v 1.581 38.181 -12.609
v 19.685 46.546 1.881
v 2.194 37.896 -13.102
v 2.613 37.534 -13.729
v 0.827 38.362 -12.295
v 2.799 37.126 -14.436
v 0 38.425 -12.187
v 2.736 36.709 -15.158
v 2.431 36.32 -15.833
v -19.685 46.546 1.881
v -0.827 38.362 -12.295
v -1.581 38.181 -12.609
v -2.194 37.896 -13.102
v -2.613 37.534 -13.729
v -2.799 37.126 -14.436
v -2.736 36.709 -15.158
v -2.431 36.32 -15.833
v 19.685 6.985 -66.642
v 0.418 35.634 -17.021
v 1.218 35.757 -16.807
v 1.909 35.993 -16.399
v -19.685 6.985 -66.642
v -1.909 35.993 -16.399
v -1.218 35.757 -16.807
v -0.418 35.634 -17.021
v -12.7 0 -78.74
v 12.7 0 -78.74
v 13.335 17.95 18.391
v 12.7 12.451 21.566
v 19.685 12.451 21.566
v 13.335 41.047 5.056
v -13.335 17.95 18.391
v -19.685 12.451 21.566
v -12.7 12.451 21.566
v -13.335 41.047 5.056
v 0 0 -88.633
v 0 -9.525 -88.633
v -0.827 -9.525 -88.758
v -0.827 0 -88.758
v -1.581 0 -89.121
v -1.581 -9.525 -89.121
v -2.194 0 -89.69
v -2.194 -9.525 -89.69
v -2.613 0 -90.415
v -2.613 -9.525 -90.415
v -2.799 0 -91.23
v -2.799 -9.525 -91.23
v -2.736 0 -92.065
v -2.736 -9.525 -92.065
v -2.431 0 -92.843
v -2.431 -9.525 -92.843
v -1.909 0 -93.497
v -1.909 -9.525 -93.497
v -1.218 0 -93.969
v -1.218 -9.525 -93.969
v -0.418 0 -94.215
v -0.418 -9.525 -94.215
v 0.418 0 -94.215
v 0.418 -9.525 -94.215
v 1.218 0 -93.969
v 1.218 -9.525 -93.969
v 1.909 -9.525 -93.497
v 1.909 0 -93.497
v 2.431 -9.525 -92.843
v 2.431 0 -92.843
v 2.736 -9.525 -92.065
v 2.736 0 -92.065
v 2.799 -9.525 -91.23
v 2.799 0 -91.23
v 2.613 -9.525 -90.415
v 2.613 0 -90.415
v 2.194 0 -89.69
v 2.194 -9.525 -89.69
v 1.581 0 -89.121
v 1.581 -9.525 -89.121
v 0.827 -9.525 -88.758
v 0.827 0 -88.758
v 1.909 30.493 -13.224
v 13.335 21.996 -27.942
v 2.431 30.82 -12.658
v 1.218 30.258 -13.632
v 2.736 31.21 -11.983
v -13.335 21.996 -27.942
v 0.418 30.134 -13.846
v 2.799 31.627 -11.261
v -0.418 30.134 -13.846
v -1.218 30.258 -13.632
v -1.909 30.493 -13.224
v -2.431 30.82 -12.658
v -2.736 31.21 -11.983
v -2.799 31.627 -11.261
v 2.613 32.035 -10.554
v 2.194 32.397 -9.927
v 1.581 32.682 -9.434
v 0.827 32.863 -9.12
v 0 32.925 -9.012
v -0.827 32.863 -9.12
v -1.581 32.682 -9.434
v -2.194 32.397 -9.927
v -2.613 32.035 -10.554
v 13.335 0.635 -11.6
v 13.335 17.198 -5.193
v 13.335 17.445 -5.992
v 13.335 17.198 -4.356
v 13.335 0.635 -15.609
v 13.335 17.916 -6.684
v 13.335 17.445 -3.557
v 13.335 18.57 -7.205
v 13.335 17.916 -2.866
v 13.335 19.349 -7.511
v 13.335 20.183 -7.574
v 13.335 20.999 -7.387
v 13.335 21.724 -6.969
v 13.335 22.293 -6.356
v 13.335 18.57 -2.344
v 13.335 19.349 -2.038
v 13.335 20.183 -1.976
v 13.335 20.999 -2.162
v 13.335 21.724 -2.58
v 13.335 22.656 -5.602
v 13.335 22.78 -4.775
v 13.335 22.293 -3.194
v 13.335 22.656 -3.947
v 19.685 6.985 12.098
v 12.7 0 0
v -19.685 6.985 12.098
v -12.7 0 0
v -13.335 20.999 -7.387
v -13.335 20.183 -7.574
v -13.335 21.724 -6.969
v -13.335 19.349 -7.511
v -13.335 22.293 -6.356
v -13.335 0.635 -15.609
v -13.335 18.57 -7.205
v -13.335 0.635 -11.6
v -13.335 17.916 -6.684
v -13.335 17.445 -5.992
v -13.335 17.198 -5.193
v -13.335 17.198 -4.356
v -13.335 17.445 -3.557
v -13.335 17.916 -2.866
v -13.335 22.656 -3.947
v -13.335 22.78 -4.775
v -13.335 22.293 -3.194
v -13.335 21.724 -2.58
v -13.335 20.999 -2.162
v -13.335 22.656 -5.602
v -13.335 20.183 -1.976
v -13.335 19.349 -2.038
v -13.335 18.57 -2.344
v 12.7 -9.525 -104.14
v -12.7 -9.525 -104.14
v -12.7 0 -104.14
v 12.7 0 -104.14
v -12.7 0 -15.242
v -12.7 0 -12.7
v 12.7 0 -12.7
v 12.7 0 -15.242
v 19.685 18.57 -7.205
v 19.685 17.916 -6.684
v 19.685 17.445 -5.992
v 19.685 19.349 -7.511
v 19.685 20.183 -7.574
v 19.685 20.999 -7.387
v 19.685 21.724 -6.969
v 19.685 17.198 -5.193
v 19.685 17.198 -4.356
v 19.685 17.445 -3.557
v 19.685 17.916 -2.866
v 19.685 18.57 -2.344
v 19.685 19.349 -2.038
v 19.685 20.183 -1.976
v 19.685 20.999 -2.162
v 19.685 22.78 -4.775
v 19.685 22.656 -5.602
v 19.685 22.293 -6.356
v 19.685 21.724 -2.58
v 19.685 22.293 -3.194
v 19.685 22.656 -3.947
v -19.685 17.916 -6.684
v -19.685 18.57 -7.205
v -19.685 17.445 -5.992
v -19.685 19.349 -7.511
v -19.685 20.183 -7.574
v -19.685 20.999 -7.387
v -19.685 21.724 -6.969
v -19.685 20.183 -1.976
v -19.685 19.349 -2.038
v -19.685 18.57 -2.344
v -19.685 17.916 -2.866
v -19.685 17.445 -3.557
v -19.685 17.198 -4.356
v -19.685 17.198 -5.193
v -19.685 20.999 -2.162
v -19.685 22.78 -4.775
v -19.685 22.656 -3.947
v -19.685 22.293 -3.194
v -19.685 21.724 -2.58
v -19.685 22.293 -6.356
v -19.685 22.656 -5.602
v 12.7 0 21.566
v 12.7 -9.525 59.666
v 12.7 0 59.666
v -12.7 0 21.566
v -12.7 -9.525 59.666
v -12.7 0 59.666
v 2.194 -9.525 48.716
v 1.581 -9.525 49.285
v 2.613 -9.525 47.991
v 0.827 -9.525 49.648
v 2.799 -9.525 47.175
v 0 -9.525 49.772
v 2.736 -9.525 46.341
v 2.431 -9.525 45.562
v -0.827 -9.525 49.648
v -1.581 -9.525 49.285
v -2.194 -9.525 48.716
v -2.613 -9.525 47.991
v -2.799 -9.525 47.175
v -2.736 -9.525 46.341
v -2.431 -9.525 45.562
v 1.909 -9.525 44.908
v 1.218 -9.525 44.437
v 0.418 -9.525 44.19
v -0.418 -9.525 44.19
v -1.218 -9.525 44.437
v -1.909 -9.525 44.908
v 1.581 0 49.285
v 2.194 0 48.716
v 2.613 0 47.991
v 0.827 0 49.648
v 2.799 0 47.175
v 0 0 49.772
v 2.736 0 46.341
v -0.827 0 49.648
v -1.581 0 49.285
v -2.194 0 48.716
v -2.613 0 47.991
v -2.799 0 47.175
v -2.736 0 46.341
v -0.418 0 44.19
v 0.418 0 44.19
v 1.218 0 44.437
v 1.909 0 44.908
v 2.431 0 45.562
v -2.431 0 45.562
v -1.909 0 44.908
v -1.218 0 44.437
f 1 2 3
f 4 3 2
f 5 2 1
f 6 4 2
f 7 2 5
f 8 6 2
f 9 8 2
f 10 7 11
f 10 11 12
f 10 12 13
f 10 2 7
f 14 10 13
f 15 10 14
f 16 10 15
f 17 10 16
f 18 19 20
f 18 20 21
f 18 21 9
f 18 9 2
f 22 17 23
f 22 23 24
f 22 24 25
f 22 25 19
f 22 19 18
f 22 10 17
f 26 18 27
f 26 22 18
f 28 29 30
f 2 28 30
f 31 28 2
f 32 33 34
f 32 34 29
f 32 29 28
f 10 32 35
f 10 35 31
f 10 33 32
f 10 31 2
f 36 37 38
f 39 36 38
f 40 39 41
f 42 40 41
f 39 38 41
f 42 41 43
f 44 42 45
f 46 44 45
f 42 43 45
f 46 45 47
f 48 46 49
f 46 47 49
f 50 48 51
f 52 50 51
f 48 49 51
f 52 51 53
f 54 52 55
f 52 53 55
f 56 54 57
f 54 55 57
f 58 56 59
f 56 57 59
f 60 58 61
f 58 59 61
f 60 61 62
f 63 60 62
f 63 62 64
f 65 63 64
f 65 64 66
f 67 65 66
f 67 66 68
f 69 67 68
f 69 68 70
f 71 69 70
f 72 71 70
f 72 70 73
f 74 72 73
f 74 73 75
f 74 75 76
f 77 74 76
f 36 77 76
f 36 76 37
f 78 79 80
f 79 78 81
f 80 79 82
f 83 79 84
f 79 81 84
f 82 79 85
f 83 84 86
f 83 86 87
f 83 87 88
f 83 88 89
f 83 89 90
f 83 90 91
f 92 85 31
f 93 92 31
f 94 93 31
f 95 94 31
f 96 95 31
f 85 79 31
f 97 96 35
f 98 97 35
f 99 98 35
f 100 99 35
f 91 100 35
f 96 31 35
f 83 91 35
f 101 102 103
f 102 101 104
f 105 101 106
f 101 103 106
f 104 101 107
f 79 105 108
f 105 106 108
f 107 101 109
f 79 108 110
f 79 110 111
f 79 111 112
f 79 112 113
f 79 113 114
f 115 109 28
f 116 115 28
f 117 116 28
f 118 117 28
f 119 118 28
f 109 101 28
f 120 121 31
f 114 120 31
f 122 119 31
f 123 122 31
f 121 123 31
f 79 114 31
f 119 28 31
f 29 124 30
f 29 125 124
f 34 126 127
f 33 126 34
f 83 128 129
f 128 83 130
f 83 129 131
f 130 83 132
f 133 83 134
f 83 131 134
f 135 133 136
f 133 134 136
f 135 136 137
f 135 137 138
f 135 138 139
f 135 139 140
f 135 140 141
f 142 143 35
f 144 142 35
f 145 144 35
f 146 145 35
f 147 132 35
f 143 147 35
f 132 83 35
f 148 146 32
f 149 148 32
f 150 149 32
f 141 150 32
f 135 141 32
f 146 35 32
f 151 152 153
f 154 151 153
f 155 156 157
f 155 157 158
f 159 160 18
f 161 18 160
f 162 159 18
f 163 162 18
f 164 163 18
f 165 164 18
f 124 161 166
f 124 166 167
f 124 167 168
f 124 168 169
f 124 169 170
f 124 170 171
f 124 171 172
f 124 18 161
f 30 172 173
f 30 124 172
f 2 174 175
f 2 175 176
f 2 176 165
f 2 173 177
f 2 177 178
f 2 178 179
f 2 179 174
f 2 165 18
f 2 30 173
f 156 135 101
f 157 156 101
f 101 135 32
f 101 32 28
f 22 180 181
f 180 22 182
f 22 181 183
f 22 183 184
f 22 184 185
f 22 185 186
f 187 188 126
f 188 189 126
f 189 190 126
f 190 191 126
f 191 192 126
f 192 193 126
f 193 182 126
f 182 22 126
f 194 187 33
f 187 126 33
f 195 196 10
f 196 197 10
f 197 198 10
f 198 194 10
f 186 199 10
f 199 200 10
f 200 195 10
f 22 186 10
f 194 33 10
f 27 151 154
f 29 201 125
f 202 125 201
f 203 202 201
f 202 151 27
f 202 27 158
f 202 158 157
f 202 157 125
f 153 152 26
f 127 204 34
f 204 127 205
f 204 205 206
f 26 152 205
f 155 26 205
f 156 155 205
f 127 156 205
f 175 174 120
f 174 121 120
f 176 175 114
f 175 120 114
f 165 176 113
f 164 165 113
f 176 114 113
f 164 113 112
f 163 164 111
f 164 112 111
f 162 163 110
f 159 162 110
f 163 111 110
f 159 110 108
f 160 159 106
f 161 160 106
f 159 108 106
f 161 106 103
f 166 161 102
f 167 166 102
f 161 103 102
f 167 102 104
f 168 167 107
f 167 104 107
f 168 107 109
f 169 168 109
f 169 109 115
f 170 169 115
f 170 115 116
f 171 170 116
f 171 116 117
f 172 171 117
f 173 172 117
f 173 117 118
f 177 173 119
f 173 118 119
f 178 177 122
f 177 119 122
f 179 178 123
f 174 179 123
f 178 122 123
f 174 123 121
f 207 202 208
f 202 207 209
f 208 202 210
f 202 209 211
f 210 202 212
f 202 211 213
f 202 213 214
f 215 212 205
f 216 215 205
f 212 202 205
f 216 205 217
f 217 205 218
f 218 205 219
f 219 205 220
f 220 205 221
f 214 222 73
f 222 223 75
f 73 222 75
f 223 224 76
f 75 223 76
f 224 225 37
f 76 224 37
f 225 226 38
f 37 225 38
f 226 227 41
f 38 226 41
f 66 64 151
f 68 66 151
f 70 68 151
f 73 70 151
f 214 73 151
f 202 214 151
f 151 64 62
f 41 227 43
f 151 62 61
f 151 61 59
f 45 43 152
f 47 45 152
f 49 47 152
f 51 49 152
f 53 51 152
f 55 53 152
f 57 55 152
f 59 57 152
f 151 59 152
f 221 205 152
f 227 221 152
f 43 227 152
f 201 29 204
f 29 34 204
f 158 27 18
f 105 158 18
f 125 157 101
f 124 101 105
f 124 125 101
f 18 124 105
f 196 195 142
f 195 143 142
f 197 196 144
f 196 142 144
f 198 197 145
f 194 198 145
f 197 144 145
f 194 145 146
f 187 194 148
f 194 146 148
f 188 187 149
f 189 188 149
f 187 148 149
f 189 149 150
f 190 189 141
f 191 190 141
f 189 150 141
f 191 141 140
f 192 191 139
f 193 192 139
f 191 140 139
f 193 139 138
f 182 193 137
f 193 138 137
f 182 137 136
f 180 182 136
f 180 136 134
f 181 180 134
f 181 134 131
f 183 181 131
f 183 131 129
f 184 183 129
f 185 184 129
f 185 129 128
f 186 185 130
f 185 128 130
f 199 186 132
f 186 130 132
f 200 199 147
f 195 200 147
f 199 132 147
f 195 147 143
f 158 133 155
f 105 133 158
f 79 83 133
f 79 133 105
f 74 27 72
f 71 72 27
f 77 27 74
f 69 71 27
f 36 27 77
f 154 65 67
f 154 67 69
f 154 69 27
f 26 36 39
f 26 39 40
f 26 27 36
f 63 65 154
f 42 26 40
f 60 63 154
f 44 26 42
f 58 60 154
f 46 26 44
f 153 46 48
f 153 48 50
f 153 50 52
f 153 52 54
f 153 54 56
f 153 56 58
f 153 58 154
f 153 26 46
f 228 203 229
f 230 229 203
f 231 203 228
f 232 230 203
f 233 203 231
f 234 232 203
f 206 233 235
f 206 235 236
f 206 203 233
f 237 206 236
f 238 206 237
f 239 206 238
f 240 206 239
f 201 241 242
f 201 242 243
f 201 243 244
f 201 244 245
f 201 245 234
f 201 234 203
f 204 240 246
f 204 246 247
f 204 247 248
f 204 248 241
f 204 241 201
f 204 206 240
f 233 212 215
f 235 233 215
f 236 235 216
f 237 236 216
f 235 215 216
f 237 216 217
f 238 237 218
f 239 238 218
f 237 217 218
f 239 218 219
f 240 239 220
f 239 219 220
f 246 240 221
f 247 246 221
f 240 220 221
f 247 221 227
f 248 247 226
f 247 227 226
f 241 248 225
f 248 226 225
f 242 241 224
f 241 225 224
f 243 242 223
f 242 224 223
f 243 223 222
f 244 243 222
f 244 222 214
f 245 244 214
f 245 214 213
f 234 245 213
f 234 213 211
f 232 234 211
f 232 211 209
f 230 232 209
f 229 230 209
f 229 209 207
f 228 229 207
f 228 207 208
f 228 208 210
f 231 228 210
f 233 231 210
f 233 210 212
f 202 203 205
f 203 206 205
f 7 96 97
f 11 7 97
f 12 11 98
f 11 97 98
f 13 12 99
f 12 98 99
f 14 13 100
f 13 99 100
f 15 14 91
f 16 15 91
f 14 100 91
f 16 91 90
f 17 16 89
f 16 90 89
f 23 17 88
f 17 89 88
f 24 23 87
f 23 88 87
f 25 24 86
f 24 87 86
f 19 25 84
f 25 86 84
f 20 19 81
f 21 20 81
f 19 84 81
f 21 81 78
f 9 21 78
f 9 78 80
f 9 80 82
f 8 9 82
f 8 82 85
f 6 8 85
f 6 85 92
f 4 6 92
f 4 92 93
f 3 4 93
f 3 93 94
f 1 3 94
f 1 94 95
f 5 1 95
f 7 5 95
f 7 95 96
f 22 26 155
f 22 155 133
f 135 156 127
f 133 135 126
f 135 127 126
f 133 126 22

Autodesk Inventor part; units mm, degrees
ref_plane "YZ Plane" through (0, 0, 0) normal (1, 0, 0) x (0, 1, 0)
ref_plane "XZ Plane" through (0, 0, 0) normal (0, 1, 0) x (-1, 0, 0)
ref_plane "XY Plane" through (0, 0, 0) normal (0, 0, 1) x (1, 0, 0)
sketch "Sketch1" plane through (0, 0, 0) normal (1, 0, 0) x (0, 1, 0)
  line L0 (0, 0) -> (12.4509, 21.5656)
  line L1 (12.4509, 21.5656) -> (46.5463, 1.8806)
  line L2 (0, -101.8491) -> (0, 42.1347) projected
  line L3 (46.5463, 1.8806) -> (0, -78.74)
  line L4 (0, 0) -> (0, -78.74)
  line L5 (19.05, 17.7556) -> (0, -15.24) construction
  dimension "d0" = 39.37
  dimension "d1" = 30
  dimension "d5" = 7.62
  dimension "d6" = 38.1
extrude "Extrusion1" add sketch "Sketch1" along normal mid plane 39.37
sketch "Sketch2" plane through (-19.685, 12.4509, 21.5656) normal (0, 0.5, 0.866) x (1, 0, 0)
  line L0 (0, 0) -> (39.37, 0) construction
  line L1 (39.37, 0) -> (39.37, 39.37) construction
  line L2 (0, 0) -> (39.37, 39.37) construction
  line L3 (39.37, 39.37) -> (0, 39.37) construction
  line L4 (0, 39.37) -> (39.37, 0) construction
  line L5 (6.35, 6.35) -> (33.02, 6.35)
  line L6 (33.02, 6.35) -> (33.02, 33.02)
  line L7 (33.02, 33.02) -> (6.35, 33.02)
  line L8 (6.35, 33.02) -> (6.35, 6.35)
  line L9 (6.35, 6.35) -> (33.02, 33.02) construction
  line L10 (33.02, 6.35) -> (6.35, 33.02) construction
  point P0 (19.685, 0)
  point P1 (19.685, 19.685)
  dimension "d7" = 26.67
extrude "Extrusion2" cut sketch "Sketch2" against normal blind 38.1
sketch "Sketch3" plane through (0, 0, 0) normal (1, 0, 0) x (0, 1, 0)
  line L0 (12.4509, 21.5656) -> (0, 0) projected
  line L1 (0, 0) -> (0, -78.74) projected
  line L2 (0, -78.74) -> (46.5463, 1.8806) projected
  line L3 (21.997, -27.94) -> (0, -15.24) projected
  line L4 (17.9501, 18.3906) -> (0, -12.7) projected
  line L5 (0, 0) -> (0, -78.74)
  line L6 (12.4509, 21.5656) -> (-1.0999, 21.5656) construction
  line L7 (0, 0) -> (12.4509, 21.5656) projected
  line L8 (0, 0) -> (0, 59.6656)
  line L9 (46.5463, 1.8806) -> (0, -78.74) projected
  line L10 (0, -78.74) -> (0, -104.14)
  line L11 (0, -137.4091) -> (0, 77.6947) projected
  line L12 (0, 59.6656) -> (-9.525, 59.6656)
  line L13 (-9.525, 59.6656) -> (-9.525, -104.14)
  line L14 (-9.525, -104.14) -> (0, -104.14)
  point P0 (1.0999, -13.335)
  point P1 (0, -15.24)
  point P2 (0, -12.7)
  dimension "d10" = 38.1
  dimension "d11" = 25.4
  dimension "d12" = 9.525
  dimension "supportBaseLength" = 163.8056
extrude "Extrusion3" add sketch "Sketch3" along normal mid plane 25.4
sketch "Sketch5" plane through (0, 0, 0) normal (1, 0, 0) x (0, 1, 0)
  line L0 (0, 0) -> (12.4509, 21.5656) projected
  line L1 (0, 59.6656) -> (0, 0) projected
  line L2 (12.4509, 21.5656) -> (46.5463, 1.8806) projected
  line L3 (12.4509, 21.5656) -> (0, 21.5656)
  line L4 (0, 0) -> (12.4509, 21.5656)
extrude "Extrusion5" add sketch "Sketch5" along normal mid plane 25.4
sketch "Sketch4" plane through (0, 0, 0) normal (0, 0, 1) x (1, 0, 0)
  line L0 (19.685, 46.5463) -> (-19.685, 46.5463) projected
  line L1 (19.685, 0) -> (19.685, 46.5463) projected
  line L2 (19.685, 0) -> (12.7, 0) projected
  line L3 (12.7, 0) -> (-12.7, 0) projected
  line L4 (-12.7, 0) -> (-19.685, 0) projected
  line L5 (-19.685, 46.5463) -> (-19.685, 0) projected
  line L6 (-12.7, 0) -> (-12.7, -9.525) projected
  line L7 (12.7, -9.525) -> (-12.7, -9.525) projected
  line L8 (12.7, -9.525) -> (12.7, 0) projected
  line L9 (-12.7, 0) -> (-19.685, 6.985)
  line L10 (-19.685, 46.5463) -> (-19.685, 0) projected
  line L11 (-19.685, 6.985) -> (-19.685, 0)
  line L12 (0, 0) -> (0, 46.5463) construction
  line L13 (12.7, 0) -> (19.685, 0)
  line L14 (12.7, 0) -> (19.685, 6.985)
  line L15 (19.685, 6.985) -> (19.685, 0)
  dimension "d15" = 45
extrude "Extrusion4" cut sketch "Sketch4" against normal up to surface (163.8056 mm away) from surface at 59.6656 contours L1 L2 L14 | L9 L4 L5
sketch "Sketch6" plane through (-12.7, 0, 59.6656) normal (0, 1, 0) x (1, 0, 0)
  line L0 (25.4, 163.8056) -> (0, 163.8056) construction
  line L1 (12.7, 163.8056) -> (12.7, 0) construction
  line L2 (25.4, 0) -> (0, 0) construction
  point P0 (12.7, 59.6656)
  point P1 (12.7, 151.1056)
  point P2 (12.7, 12.7)
  dimension "d21" = 12.7
  dimension "d22" = 12.7
hole "Hole1" at (0, 0, -91.44) at (0, 0, 46.9656) direction (0, -1, 0) diameter 5.6134 end through all clearance for "Flat Head Machine Screw (82)" size "#10" standard "Ansi Unified Screw Threads"
sketch "Sketch9" plane through (0, 0, 0) normal (1, 0, 0) x (0, 1, 0)
  line L0 (0.635, -11.6001) -> (0.635, -15.6066) projected
  line L1 (0.635, -15.6066) -> (21.997, -27.94) projected
  line L2 (41.047, 5.0556) -> (21.997, -27.94) projected
  line L3 (17.9501, 18.3906) -> (41.047, 5.0556) projected
  line L4 (17.9501, 18.3906) -> (0.635, -11.6001) projected
  line L5 (29.4986, 11.7231) -> (10.4486, -21.2725) construction
  line L6 (0.635, -15.6066) -> (21.997, -27.94) construction
  circle A0 centre (19.9736, -4.7747) radius 2.8067
  point P0 (0, 0)
  dimension "d30" = 5.6134
extrude "Extrusion6" cut sketch "Sketch9" along normal through all both and the other way through all contours A0
sketch "Sketch10" plane through (-19.685, 46.5463, 1.8806) normal (0, 0.866, -0.5) x (1, 0, 0)
  line L0 (6.35, 0) -> (33.02, 0) construction
  line L1 (19.685, 0) -> (19.685, 77.7875) construction
  point P0 (19.685, 24.9018)
  point P1 (19.685, 19.05)
  dimension "d33" = 19.05
hole "Hole2" at (0, 37.0213, -14.6172) direction (0, -0.866, 0.5) diameter 5.6134 depth 6.35 clearance for "Flat Head Machine Screw (82)" size "#10" standard "Ansi Unified Screw Threads"
equation "\"d0\" = widthToSupportExtrusion"
equation "\"d1\" = attachementAngle"
equation "\"d6\" = insertDepth"
equation "\"d2\" = widthToSupportExtrusion"
equation "\"d7\" = insertForExtrusion"
equation "\"d8\" = insertDepth"
equation "\"d10\" = lenghtUnderBrace"
equation "\"d11\" = backLength"
equation "\"d12\" = supportBaseDepth"
equation "\"d13\" = supportBaseWidth"
equation "\"d19\" = supportBaseWidth"
equation "\"d21\" = supportHoleDistanceFromEnd"
equation "\"d22\" = supportHoleDistanceFromEnd"
equation "\"attachementAngle\" = 30deg"
equation "\"extrusionSize\" = 25.4"
equation "\"wallThickness\" = 6.35"
equation "\"slipClearance\" = 0.635"
equation "\"insertForExtrusion\" = extrusionSize + 2 * slipClearance"
equation "\"widthToSupportExtrusion\" = insertForExtrusion + 2 * wallThickness"
equation "\"insertDepth\" = 38.1"
equation "\"supportBaseWidth\" = 25.4"
equation "\"supportBaseDepth\" = 9.525"
equation "\"supportHoleDistanceFromEnd\" = 12.7"
equation "\"lenghtUnderBrace\" = 38.1"
equation "\"backLength\" = 25.4"
properties part number "30DegreeAttachementV03"
